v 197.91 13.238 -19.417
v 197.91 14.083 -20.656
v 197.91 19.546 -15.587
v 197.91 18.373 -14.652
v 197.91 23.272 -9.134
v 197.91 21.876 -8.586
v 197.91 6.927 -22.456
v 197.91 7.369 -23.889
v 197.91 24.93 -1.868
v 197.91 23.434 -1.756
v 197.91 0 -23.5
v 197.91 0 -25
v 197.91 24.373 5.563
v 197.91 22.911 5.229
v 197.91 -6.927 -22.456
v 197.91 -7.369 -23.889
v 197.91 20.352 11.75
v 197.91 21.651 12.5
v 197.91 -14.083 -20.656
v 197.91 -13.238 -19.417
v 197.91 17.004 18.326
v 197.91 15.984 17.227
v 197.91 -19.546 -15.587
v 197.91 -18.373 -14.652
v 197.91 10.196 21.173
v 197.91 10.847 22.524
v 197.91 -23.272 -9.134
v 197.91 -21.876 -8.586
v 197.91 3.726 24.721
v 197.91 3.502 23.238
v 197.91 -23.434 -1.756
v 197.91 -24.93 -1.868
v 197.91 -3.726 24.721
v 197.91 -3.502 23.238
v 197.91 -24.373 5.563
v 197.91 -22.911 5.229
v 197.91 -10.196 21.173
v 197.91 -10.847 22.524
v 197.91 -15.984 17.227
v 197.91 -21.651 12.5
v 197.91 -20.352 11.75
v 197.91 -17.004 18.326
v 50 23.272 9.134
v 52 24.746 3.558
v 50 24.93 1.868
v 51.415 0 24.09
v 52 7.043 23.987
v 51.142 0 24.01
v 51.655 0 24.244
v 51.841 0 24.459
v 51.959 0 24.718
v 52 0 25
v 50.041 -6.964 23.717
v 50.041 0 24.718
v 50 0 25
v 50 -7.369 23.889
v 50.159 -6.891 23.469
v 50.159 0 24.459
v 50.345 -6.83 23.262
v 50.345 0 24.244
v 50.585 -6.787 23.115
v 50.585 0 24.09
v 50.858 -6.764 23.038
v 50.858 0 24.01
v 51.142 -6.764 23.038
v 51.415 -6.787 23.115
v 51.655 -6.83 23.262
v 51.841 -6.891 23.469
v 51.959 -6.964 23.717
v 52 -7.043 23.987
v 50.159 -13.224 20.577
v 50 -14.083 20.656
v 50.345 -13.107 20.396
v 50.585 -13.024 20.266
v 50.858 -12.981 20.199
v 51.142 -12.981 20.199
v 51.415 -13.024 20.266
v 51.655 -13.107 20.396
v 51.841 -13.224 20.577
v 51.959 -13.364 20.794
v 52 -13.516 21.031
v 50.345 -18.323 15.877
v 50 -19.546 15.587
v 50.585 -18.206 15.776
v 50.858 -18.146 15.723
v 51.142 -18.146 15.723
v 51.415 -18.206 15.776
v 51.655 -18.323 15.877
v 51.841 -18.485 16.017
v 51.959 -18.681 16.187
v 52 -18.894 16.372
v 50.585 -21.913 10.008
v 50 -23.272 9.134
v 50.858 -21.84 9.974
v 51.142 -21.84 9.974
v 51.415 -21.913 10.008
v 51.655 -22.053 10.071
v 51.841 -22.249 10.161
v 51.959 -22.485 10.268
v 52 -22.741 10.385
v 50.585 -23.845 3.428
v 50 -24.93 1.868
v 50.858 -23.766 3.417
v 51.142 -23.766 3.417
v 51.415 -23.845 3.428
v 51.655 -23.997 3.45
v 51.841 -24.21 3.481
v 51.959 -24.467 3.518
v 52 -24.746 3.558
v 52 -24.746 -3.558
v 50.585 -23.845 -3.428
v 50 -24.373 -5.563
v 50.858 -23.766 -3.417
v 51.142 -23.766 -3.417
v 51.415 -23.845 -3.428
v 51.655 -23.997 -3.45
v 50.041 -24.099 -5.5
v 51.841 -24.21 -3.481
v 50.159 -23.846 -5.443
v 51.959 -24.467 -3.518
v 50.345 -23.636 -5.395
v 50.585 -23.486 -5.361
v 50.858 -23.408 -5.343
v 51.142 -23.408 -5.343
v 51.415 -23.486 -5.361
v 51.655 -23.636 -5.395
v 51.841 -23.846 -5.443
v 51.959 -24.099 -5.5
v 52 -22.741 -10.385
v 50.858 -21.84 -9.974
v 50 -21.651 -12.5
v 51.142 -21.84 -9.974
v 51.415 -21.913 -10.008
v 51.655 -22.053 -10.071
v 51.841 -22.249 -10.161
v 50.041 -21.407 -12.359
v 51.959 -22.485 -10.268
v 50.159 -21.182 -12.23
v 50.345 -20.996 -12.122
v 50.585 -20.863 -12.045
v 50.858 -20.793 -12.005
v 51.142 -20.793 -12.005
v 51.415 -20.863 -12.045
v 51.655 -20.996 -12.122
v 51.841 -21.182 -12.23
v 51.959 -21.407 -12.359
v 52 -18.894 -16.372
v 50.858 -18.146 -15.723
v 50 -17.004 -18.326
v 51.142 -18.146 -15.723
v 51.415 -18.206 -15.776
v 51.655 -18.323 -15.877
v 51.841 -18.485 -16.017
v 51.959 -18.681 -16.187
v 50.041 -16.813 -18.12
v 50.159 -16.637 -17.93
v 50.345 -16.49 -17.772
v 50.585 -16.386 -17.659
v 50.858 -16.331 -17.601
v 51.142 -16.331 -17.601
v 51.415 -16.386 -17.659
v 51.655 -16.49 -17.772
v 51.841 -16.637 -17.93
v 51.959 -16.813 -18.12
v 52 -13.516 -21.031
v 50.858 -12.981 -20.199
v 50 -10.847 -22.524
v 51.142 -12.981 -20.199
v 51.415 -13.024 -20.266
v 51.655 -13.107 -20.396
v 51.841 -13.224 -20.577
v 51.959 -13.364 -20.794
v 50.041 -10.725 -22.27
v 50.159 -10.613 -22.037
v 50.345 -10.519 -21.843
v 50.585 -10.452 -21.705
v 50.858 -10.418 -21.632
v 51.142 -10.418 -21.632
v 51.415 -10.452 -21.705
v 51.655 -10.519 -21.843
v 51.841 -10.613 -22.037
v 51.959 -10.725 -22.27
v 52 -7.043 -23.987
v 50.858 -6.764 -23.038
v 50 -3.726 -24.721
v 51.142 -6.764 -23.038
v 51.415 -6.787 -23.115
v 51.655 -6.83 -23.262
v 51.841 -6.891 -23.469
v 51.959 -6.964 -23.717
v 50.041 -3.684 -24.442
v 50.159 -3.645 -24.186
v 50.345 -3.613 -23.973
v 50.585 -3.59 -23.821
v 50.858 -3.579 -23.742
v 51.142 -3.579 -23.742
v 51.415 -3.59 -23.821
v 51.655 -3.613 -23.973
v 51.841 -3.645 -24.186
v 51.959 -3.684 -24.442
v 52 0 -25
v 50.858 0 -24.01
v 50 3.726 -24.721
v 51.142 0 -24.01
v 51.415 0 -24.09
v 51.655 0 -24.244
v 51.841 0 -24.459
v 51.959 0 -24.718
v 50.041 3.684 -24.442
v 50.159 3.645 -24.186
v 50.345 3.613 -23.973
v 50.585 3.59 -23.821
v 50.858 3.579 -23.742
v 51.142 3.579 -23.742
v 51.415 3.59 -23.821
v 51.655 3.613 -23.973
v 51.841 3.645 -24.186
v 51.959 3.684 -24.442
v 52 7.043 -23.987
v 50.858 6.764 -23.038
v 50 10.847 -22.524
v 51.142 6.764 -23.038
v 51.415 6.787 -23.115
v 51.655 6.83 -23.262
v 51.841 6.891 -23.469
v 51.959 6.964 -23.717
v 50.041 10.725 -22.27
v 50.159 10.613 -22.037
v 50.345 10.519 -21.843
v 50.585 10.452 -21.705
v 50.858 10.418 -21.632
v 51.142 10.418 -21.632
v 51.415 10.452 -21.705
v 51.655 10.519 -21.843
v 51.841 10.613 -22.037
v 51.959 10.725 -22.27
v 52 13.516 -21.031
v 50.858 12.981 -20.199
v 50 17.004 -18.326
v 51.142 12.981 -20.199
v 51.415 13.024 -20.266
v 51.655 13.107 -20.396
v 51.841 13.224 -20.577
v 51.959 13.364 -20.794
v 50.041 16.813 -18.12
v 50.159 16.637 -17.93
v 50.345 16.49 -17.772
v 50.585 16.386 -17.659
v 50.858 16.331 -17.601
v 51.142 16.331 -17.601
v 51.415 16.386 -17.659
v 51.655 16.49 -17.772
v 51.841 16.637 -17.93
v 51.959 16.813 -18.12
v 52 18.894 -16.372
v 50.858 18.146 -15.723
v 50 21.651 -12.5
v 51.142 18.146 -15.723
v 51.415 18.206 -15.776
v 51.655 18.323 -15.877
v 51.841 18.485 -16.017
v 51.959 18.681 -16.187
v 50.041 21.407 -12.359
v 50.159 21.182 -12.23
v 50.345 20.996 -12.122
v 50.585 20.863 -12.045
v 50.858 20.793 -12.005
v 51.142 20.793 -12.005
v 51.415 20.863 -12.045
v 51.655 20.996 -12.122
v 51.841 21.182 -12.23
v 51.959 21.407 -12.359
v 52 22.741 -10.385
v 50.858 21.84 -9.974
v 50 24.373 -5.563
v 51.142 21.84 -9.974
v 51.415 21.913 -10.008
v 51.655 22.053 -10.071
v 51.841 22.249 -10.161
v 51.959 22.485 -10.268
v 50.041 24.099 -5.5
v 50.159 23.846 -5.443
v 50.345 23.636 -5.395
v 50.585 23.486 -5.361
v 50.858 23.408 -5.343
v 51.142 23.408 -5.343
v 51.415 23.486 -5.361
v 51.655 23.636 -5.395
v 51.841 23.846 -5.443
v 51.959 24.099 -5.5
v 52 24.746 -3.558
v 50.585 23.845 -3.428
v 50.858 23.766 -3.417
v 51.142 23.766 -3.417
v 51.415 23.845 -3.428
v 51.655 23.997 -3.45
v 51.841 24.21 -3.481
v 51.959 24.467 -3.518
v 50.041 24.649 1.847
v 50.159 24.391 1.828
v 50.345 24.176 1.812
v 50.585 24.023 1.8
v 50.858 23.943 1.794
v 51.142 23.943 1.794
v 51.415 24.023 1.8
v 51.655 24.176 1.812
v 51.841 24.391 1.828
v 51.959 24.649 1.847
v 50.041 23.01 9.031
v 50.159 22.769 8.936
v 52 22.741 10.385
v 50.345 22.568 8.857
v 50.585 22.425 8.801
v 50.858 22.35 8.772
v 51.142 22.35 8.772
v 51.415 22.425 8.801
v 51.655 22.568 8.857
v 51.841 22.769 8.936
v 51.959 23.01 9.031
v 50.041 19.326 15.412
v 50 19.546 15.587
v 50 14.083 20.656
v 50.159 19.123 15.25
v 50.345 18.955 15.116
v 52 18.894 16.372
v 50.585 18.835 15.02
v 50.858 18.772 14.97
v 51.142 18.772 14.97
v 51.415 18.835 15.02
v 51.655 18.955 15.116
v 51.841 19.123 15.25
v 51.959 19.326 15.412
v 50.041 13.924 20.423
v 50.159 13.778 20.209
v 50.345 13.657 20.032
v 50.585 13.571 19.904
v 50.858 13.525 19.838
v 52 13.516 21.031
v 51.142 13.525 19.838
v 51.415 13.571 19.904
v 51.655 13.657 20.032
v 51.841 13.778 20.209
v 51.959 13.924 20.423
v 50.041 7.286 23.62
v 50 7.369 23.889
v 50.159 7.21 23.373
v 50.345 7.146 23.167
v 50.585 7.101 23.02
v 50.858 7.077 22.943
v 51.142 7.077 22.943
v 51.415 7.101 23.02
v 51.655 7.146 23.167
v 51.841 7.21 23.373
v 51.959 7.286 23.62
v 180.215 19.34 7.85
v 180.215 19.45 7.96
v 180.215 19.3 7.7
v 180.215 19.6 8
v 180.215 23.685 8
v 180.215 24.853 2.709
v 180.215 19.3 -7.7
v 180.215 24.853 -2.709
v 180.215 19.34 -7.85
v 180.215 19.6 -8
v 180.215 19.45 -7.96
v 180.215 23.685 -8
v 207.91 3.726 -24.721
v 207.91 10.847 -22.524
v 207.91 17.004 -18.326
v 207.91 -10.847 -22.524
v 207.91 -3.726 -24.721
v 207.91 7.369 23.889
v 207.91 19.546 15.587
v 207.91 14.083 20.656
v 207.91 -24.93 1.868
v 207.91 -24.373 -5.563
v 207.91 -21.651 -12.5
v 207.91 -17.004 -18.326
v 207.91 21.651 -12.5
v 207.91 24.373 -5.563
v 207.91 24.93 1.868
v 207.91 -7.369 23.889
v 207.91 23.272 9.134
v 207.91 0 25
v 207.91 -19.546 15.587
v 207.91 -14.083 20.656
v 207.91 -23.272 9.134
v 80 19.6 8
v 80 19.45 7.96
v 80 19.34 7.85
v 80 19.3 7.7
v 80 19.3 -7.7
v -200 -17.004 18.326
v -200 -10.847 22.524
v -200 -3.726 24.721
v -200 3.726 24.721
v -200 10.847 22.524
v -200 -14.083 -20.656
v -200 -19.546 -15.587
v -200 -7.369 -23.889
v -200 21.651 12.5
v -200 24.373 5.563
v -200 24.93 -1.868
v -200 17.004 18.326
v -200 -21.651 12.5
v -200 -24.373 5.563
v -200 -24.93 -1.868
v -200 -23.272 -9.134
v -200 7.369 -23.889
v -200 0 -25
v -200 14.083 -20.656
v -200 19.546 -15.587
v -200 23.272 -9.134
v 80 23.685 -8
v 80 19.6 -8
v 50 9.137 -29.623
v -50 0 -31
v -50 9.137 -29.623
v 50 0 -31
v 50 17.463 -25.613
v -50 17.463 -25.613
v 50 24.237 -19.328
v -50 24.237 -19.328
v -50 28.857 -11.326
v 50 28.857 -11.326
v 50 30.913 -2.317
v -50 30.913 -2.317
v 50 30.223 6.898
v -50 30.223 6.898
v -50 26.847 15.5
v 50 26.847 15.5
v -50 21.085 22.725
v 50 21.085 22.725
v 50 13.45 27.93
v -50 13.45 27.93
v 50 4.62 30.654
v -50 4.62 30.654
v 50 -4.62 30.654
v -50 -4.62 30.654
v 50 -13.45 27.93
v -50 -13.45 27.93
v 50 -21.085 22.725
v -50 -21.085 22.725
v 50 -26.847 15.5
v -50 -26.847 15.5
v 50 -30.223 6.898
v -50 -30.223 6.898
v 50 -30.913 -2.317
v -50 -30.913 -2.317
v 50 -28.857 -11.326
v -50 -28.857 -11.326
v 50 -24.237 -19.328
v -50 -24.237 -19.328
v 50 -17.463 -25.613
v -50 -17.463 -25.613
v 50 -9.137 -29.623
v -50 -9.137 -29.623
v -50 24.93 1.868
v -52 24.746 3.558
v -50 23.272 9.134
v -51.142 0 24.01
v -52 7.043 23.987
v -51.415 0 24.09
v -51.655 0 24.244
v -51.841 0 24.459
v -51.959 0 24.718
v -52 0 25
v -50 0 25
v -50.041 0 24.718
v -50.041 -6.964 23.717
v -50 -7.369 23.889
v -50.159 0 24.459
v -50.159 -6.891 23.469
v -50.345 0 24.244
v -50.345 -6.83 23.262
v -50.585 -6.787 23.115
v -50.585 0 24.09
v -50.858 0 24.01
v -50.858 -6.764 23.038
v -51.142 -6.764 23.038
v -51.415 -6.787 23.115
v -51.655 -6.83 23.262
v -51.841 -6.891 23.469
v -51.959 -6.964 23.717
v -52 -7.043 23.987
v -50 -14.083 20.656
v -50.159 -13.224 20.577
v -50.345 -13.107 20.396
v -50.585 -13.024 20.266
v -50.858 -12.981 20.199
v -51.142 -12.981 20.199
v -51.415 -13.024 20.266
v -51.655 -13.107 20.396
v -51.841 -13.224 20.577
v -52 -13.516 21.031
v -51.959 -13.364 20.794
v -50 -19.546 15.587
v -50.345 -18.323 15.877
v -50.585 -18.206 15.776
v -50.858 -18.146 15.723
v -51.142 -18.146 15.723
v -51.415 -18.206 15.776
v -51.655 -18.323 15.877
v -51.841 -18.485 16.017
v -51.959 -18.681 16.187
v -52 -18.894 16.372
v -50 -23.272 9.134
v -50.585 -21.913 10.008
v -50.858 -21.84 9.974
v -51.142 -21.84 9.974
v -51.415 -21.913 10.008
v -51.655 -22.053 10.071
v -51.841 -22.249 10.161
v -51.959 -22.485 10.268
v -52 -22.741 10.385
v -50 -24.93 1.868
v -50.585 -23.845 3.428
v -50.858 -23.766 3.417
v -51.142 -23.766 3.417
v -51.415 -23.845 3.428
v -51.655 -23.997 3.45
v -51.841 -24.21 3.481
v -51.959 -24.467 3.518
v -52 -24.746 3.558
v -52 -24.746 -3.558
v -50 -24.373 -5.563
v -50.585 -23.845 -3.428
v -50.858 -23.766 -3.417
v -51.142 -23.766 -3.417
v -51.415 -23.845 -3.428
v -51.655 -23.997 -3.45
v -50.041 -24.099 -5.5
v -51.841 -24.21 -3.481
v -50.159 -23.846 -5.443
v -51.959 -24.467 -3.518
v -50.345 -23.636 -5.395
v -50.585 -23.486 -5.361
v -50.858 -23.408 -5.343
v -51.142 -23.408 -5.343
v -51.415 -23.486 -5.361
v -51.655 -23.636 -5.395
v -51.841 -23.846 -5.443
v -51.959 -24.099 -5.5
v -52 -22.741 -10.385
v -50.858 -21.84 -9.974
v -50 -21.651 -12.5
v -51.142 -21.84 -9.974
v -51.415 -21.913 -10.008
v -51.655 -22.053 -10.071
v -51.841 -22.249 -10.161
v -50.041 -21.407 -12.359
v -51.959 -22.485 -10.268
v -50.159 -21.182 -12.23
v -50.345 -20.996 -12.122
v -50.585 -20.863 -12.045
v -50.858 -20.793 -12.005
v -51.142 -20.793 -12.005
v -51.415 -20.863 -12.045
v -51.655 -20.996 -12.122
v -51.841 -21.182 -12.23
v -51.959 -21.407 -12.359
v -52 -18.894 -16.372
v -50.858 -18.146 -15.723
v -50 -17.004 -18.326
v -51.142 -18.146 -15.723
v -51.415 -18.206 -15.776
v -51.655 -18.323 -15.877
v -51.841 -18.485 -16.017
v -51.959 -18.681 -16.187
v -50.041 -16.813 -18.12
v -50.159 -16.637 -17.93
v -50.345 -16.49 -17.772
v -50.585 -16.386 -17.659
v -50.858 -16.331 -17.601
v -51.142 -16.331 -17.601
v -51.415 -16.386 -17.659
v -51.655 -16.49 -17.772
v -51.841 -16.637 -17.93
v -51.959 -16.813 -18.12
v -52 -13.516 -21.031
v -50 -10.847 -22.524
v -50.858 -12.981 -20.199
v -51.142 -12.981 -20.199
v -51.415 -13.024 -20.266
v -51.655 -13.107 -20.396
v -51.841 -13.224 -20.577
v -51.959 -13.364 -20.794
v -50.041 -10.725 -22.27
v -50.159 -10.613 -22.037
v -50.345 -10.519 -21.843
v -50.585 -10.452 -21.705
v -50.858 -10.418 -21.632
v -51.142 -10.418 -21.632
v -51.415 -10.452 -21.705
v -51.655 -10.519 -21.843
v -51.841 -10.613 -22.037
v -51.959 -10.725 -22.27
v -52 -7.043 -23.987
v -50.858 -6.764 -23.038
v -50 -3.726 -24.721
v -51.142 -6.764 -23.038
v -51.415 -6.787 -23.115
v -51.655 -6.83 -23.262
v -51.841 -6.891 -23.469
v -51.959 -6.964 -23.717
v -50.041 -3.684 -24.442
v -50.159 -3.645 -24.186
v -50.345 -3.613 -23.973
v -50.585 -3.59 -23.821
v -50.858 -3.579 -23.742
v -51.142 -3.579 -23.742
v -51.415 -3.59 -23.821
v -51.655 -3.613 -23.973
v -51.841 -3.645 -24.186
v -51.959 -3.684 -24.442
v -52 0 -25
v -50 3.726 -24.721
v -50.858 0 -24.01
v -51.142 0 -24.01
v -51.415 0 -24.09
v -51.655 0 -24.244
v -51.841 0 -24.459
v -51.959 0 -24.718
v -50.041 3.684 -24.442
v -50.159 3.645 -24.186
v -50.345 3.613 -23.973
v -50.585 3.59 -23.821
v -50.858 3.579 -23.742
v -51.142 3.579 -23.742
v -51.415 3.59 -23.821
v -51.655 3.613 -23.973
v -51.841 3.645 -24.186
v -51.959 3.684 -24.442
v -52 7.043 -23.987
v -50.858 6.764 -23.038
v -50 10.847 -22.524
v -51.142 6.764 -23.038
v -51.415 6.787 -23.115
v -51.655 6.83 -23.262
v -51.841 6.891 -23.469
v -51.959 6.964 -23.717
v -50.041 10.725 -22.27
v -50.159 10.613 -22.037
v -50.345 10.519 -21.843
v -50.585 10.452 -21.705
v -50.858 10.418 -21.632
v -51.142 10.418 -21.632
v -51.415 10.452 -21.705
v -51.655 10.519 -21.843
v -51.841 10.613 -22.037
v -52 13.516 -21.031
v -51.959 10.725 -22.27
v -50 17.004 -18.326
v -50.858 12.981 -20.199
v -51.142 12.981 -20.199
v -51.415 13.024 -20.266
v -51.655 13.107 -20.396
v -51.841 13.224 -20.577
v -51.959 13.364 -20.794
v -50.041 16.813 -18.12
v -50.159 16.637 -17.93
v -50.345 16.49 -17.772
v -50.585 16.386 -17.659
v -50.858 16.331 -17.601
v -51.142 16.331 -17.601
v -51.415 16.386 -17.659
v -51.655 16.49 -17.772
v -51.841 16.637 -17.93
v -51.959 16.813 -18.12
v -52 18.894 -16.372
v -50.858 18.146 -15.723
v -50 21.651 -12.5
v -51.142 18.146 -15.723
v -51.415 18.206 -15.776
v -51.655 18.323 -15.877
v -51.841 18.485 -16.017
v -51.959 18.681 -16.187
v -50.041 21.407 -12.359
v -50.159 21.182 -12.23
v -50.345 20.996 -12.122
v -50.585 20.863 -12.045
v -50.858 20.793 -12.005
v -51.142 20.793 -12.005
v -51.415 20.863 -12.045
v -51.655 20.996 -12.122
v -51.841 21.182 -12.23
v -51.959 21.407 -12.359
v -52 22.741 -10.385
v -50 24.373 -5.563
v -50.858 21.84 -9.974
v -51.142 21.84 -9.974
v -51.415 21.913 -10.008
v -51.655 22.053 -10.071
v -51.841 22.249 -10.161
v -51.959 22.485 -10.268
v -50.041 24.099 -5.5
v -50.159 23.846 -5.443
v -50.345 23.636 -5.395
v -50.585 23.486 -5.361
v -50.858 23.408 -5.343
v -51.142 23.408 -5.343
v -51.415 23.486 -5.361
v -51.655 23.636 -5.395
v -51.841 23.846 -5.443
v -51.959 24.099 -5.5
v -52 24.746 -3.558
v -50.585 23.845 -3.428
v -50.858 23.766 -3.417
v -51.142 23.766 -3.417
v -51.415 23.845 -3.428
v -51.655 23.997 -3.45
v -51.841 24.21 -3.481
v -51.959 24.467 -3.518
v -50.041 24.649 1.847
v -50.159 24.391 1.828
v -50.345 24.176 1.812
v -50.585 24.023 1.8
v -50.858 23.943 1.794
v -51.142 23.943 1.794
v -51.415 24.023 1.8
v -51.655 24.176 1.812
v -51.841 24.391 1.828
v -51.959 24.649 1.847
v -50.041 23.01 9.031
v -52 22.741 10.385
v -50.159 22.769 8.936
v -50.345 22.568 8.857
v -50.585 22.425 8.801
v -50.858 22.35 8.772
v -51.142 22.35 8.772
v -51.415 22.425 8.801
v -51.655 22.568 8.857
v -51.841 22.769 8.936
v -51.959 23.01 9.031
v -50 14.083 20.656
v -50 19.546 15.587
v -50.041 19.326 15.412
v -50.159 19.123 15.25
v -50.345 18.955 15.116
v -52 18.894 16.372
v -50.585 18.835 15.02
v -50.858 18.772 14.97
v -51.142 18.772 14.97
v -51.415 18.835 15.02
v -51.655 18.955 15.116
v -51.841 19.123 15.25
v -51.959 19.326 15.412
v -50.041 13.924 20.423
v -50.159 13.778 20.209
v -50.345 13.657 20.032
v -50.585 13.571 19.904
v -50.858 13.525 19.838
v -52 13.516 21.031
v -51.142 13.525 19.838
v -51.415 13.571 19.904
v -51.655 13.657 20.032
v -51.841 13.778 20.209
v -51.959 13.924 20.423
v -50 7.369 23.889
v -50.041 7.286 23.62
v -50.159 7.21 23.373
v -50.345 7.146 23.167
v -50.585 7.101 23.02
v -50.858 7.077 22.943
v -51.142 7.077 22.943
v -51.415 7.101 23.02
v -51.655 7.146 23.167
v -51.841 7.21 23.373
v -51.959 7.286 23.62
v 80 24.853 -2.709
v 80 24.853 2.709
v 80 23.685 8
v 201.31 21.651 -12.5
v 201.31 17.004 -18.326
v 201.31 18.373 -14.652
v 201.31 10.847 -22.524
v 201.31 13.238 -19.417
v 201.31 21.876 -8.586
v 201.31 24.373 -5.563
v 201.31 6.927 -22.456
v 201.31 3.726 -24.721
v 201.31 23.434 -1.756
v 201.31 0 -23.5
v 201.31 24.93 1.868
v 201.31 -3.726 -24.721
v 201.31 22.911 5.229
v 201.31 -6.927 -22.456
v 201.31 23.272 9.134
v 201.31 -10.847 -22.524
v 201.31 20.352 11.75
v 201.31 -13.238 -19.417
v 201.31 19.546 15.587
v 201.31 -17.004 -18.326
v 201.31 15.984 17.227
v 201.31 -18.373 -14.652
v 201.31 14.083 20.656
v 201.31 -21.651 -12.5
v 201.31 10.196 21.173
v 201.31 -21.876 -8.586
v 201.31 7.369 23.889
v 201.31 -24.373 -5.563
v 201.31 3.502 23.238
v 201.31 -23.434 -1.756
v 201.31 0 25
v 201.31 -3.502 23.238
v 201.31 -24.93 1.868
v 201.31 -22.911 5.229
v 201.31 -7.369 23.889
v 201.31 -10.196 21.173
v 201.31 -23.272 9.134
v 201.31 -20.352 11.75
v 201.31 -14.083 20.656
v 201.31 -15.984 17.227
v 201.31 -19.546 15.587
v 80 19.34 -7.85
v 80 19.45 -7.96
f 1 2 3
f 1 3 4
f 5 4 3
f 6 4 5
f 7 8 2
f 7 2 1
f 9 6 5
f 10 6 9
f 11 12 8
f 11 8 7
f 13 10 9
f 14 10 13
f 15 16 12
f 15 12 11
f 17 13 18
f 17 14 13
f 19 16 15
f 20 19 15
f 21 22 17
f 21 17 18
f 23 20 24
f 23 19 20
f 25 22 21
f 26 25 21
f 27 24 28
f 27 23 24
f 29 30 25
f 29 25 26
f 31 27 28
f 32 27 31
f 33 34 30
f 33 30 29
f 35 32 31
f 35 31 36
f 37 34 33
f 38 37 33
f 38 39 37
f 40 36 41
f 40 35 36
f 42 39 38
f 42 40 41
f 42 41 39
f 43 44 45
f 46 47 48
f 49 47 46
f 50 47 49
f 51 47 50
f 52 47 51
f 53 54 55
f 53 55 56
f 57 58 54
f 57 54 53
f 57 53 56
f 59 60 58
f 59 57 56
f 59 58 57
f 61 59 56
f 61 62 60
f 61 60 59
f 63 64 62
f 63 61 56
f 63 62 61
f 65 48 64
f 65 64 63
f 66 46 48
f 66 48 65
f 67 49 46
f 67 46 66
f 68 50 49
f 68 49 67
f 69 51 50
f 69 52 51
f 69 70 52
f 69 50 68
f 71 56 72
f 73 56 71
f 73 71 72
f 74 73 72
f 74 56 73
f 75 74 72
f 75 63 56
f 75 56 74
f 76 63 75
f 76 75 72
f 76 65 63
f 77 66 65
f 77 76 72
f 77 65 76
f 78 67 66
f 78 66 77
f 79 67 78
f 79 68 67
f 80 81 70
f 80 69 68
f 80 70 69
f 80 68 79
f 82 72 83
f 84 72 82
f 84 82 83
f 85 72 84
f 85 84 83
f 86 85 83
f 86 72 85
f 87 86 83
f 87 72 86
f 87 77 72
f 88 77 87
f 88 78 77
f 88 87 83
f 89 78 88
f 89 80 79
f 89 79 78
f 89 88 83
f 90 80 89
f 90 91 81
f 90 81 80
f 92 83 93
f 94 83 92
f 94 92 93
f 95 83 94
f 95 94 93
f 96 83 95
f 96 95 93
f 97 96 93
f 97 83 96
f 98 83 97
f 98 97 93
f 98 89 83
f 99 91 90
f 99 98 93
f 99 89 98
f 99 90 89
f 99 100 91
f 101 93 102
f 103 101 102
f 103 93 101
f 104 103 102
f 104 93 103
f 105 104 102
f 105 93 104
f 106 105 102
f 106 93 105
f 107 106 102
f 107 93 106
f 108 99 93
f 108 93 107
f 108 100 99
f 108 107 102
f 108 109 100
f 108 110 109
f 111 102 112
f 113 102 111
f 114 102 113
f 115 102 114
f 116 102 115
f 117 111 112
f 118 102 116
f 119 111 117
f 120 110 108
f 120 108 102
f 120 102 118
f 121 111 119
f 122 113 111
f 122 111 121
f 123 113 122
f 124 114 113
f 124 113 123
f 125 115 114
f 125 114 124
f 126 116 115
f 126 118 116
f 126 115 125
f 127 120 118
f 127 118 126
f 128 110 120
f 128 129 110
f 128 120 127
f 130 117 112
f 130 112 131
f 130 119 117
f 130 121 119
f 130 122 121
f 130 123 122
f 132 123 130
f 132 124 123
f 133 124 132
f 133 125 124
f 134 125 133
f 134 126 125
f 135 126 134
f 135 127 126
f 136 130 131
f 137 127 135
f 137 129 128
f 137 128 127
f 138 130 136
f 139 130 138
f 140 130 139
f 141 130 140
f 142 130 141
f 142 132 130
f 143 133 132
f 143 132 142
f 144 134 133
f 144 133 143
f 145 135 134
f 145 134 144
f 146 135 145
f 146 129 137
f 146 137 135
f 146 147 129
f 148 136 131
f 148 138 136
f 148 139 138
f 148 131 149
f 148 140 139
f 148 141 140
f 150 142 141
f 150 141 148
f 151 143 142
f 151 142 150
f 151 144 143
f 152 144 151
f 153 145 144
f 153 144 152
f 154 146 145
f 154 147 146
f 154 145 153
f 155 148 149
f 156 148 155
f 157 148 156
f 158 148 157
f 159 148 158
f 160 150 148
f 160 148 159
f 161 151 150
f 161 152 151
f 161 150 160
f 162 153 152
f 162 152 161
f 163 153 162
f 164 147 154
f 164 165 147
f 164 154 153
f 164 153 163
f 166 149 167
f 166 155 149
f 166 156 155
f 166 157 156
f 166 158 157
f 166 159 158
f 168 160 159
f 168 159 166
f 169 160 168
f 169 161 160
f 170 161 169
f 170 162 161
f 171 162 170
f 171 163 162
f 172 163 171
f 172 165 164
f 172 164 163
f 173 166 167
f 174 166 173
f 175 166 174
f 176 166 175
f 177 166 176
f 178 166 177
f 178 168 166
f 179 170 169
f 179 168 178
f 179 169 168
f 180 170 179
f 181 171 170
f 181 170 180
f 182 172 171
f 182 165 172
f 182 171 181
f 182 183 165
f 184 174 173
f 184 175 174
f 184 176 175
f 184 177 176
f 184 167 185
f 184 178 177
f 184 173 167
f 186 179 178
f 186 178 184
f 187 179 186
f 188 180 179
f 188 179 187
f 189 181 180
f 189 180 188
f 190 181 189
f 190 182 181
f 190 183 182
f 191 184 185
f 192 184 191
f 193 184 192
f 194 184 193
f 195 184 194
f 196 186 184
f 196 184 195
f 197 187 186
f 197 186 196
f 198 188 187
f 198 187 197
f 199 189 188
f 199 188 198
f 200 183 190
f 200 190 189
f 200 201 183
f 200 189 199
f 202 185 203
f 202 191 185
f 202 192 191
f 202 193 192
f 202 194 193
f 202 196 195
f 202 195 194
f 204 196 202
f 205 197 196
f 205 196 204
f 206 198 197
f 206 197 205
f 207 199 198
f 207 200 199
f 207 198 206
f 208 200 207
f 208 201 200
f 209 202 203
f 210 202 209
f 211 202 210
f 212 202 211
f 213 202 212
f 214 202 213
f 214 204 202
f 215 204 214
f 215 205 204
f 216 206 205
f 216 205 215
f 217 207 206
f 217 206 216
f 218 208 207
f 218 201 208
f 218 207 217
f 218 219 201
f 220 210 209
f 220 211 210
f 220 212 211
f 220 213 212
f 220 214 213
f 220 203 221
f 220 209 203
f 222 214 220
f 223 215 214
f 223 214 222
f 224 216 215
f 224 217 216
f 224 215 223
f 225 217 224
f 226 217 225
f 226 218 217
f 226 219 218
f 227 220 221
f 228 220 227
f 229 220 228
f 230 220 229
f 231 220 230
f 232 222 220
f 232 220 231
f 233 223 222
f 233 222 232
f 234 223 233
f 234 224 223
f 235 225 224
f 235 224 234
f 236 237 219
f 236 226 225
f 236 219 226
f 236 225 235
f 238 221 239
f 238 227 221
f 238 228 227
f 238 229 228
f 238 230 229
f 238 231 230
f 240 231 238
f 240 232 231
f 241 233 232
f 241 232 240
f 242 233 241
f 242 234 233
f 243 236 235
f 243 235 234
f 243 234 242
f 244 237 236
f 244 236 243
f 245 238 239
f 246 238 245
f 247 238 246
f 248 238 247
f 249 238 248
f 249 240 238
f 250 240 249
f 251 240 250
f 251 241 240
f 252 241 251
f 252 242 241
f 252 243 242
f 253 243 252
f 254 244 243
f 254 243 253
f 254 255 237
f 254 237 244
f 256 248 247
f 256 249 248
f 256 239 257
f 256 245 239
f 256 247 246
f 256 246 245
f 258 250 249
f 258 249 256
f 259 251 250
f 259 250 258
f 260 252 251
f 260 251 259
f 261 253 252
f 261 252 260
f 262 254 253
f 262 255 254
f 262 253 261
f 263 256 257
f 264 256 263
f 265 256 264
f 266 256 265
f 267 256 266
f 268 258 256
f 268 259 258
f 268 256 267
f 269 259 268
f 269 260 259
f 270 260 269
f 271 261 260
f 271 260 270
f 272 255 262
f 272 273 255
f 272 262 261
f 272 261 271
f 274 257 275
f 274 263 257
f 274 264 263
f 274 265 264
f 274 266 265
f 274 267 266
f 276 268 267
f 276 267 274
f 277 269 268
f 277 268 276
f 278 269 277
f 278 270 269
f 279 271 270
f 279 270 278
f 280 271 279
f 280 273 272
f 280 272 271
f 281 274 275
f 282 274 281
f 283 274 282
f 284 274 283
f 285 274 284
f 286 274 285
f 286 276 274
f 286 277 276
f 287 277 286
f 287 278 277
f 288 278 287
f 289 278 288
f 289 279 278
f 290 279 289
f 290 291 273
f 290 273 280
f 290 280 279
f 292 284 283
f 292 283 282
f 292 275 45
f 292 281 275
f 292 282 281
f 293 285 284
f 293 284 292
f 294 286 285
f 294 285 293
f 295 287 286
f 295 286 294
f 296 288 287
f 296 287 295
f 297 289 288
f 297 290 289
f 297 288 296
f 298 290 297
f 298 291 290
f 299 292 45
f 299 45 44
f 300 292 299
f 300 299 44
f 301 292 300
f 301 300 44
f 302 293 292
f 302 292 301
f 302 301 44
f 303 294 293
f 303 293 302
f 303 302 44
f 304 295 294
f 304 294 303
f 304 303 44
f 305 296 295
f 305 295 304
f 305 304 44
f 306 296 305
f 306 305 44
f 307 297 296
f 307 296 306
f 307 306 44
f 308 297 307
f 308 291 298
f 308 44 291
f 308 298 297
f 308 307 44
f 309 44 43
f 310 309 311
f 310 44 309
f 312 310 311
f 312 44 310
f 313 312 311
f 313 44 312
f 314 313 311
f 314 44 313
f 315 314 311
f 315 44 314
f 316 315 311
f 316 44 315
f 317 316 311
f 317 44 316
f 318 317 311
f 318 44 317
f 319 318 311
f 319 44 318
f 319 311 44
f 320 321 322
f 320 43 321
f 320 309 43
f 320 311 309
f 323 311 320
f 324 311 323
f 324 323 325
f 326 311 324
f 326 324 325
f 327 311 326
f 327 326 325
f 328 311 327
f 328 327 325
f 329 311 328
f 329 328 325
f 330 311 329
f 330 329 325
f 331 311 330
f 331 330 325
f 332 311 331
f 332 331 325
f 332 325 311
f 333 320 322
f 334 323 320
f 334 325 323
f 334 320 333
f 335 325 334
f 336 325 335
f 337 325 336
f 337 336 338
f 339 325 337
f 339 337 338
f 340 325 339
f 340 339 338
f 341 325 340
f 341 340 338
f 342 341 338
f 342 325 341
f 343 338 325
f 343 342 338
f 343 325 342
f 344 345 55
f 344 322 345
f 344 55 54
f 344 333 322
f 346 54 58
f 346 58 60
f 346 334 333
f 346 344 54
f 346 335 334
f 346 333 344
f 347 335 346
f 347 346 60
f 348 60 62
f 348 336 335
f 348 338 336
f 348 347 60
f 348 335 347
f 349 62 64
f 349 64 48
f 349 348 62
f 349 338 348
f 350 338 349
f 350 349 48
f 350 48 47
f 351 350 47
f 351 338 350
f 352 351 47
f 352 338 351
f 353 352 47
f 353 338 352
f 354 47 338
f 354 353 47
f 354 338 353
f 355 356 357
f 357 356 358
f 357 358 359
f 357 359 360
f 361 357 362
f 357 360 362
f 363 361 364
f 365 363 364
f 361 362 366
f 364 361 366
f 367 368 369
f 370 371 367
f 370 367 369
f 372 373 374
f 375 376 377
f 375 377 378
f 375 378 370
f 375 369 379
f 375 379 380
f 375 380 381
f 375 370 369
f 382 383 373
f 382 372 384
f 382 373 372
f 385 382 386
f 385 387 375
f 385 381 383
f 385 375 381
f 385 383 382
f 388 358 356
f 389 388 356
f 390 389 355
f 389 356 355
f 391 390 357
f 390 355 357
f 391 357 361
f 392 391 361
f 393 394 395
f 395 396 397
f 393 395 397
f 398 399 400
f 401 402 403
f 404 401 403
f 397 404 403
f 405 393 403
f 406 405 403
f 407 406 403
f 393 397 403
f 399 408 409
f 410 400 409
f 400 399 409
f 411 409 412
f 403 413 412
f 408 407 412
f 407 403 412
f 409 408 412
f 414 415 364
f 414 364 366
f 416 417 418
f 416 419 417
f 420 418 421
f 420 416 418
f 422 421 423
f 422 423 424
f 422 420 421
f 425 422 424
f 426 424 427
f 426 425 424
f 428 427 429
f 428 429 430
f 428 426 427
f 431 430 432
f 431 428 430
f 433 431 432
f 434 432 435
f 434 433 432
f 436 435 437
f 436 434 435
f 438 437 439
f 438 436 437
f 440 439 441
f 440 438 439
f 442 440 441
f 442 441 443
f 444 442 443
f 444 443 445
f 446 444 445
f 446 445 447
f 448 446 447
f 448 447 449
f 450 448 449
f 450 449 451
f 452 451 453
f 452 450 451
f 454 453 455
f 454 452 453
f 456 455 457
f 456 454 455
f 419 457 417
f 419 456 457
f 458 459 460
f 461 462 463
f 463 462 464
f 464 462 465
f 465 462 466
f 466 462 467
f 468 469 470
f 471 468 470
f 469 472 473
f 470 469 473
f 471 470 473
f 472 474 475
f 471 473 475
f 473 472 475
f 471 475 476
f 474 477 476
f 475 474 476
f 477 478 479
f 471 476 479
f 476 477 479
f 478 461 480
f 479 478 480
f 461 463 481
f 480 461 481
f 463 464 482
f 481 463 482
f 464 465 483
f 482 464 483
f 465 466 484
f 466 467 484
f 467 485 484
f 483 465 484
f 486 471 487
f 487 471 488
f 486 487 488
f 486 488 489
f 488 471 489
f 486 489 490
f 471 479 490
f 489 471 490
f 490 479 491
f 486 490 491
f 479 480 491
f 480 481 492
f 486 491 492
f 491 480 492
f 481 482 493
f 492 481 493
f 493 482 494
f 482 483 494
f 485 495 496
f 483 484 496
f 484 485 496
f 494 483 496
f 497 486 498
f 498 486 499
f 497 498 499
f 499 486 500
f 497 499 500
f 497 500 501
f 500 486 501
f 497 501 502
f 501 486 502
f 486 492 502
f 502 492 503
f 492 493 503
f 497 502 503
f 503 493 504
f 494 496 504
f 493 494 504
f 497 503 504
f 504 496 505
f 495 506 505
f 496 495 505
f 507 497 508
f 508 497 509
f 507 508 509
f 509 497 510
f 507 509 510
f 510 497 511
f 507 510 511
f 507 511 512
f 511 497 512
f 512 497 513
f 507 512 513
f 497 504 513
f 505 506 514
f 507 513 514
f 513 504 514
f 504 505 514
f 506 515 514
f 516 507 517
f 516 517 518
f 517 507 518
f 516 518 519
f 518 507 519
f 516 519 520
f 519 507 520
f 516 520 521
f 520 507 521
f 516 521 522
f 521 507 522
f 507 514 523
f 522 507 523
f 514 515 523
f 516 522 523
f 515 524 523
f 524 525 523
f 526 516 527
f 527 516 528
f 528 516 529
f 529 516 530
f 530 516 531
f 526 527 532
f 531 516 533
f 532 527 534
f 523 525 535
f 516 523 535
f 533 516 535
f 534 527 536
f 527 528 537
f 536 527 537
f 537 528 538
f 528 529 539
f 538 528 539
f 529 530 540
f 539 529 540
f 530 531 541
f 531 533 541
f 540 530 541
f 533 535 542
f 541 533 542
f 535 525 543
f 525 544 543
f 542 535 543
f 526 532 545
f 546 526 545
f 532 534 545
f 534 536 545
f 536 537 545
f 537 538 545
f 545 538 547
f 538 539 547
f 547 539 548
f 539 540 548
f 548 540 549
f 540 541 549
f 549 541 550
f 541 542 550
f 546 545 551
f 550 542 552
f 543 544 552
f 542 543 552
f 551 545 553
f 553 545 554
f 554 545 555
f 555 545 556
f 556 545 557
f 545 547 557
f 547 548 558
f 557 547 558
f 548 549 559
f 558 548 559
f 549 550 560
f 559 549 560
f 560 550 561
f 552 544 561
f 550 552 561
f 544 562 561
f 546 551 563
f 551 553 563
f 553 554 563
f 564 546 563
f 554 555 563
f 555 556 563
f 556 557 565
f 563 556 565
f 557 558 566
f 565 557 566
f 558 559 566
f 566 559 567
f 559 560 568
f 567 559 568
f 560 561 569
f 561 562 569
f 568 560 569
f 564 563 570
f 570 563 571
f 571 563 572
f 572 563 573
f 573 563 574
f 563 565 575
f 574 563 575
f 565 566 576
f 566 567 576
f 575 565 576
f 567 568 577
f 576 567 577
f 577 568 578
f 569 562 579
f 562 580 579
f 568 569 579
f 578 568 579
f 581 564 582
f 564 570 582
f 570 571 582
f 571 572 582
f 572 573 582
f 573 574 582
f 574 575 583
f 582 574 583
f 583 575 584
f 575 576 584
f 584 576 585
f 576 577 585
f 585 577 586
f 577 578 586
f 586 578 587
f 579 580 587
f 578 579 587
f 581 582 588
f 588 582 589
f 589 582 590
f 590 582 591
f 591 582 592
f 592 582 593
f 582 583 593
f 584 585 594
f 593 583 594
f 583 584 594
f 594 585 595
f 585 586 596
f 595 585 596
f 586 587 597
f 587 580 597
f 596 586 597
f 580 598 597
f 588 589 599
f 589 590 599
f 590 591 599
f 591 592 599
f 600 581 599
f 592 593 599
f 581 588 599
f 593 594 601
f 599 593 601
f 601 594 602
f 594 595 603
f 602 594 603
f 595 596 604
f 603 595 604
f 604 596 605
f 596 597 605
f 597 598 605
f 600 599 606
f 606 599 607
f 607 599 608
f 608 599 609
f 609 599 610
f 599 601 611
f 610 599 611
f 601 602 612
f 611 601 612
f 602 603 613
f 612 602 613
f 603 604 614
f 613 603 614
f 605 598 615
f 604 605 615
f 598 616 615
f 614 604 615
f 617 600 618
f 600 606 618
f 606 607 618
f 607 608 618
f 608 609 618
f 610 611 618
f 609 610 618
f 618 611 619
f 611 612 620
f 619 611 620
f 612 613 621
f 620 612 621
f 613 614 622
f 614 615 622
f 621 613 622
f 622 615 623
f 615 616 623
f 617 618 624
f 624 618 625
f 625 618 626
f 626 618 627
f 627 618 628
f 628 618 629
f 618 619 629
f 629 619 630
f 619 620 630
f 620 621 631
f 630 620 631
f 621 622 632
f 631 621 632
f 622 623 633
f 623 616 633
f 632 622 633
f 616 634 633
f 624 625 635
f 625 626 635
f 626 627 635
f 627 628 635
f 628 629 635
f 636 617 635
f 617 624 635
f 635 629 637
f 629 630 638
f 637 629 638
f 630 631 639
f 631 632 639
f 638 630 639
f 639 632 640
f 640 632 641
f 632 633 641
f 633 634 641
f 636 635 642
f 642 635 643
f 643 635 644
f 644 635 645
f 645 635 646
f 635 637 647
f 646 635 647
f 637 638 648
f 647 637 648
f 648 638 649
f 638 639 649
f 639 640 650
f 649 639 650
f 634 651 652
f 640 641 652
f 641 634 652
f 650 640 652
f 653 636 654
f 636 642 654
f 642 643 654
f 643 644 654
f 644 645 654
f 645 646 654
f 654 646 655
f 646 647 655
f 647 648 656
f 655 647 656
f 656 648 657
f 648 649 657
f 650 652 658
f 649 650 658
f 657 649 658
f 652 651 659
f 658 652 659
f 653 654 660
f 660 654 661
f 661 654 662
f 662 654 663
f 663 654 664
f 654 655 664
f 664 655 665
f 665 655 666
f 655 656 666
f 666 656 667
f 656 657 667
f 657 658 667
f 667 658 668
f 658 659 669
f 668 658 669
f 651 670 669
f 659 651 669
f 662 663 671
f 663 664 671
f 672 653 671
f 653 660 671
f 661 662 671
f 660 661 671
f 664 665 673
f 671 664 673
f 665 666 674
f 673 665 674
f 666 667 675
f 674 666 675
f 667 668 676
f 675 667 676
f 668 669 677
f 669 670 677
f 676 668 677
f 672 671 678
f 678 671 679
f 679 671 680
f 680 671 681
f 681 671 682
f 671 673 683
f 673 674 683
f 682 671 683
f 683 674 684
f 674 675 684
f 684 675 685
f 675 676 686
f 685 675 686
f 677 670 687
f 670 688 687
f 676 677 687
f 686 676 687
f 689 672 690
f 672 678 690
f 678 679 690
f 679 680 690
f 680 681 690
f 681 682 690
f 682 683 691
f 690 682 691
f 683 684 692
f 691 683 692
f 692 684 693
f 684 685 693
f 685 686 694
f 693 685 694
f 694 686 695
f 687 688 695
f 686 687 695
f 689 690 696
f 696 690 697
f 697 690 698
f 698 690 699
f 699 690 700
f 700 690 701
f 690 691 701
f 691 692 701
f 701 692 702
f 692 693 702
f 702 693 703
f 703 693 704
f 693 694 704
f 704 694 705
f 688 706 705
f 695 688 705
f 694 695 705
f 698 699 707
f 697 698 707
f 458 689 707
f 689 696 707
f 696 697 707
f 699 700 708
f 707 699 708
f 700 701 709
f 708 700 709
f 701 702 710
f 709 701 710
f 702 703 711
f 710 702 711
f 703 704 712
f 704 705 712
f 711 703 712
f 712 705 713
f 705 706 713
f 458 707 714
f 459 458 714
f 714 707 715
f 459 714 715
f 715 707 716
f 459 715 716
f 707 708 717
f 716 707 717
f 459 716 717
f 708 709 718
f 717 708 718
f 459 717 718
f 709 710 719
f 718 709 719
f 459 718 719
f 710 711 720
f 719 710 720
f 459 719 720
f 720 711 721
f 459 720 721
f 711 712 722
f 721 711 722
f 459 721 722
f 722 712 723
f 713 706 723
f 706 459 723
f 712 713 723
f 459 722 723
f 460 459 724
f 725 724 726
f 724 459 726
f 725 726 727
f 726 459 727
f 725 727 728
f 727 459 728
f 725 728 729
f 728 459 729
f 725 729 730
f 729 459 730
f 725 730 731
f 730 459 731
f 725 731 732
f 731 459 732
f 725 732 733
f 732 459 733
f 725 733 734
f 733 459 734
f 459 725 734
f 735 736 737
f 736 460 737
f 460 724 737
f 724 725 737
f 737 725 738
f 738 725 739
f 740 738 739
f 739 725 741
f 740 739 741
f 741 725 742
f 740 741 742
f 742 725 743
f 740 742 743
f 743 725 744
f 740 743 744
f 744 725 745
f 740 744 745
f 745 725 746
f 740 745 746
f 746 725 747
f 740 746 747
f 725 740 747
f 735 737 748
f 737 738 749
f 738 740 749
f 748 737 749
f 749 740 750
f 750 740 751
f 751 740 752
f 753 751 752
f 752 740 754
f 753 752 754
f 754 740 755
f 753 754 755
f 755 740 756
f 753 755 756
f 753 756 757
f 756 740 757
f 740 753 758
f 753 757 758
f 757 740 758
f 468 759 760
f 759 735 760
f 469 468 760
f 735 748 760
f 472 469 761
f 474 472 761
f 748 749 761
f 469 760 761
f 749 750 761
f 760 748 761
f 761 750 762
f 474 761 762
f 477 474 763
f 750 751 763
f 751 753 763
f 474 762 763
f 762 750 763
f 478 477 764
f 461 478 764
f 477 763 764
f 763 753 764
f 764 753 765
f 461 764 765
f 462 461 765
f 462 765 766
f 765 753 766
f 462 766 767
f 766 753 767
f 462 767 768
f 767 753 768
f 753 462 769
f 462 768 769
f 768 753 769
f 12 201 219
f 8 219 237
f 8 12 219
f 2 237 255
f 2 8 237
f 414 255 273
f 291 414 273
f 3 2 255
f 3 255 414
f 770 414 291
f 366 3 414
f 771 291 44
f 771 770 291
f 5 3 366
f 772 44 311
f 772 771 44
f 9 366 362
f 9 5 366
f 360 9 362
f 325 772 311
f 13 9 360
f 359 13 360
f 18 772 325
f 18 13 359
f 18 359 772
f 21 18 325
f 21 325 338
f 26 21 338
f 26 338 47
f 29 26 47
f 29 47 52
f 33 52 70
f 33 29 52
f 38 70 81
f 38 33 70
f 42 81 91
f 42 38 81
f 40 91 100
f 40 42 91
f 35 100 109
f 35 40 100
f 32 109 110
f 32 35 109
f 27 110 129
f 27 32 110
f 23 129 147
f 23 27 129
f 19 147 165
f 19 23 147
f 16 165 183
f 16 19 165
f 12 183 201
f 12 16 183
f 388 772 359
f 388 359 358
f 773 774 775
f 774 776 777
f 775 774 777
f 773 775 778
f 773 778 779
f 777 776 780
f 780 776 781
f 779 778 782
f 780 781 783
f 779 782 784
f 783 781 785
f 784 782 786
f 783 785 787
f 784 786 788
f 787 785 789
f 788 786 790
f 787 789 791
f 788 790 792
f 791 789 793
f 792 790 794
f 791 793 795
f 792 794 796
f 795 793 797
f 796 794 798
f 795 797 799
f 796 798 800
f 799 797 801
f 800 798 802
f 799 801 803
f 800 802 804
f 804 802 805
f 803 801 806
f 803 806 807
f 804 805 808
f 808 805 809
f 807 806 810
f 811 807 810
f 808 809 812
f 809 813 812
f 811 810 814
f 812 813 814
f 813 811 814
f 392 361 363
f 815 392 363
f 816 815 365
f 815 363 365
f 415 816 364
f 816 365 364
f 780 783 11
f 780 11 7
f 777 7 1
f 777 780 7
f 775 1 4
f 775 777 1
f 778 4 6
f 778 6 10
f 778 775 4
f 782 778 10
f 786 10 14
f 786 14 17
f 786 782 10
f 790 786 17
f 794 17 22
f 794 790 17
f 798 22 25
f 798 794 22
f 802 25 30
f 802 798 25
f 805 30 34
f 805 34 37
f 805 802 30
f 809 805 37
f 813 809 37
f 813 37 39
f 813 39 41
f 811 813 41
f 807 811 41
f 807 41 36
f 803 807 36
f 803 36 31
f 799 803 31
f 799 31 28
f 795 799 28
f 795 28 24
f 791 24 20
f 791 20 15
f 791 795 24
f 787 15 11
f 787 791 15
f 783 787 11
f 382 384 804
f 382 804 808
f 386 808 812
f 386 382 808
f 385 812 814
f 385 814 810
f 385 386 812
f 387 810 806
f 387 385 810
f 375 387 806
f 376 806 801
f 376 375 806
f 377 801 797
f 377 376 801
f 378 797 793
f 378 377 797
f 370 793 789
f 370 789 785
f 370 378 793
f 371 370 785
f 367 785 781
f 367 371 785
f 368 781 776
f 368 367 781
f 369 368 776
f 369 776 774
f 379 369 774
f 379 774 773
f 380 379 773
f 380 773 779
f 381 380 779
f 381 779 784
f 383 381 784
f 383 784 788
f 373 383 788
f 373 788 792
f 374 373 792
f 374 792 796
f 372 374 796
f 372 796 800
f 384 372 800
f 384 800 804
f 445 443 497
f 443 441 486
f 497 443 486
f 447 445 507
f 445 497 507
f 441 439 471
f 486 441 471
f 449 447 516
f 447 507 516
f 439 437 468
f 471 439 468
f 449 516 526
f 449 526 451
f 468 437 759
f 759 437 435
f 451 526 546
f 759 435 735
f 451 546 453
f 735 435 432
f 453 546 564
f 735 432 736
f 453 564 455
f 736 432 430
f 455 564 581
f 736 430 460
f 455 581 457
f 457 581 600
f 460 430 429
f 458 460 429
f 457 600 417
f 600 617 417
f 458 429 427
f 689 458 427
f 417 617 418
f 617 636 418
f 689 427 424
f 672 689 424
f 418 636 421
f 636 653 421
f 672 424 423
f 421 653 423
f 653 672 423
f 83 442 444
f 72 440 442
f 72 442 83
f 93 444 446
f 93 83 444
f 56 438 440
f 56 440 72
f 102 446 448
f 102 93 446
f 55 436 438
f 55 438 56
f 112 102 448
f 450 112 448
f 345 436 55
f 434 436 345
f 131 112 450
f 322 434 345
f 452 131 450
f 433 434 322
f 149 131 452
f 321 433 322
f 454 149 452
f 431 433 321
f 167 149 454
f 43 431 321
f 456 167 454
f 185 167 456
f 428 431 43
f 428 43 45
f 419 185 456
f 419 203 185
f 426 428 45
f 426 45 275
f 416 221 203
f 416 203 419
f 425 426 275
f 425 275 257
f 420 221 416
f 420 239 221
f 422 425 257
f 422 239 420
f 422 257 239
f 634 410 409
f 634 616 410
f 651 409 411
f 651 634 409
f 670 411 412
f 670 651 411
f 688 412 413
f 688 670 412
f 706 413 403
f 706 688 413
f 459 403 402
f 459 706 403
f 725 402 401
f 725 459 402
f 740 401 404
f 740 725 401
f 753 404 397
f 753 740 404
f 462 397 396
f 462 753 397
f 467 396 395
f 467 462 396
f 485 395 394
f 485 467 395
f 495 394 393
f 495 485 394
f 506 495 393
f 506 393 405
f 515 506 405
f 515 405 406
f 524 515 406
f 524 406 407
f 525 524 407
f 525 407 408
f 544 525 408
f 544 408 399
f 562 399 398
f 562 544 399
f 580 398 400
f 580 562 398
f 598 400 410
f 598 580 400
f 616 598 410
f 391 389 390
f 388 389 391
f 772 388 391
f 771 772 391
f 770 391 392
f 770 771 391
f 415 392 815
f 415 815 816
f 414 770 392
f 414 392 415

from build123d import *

# Parameters (mm, degrees)
SKETCH1_R           = 31
BOSS_EXTRUDE1_DEPTH = 50
SKETCH1_4_R         = 25
BOSS_EXTRUDE2_DEPTH = 200
CUT_EXTRUDE1_START  = 130.215
CUT_EXTRUDE1_DEPTH  = 100.215
BOSS_EXTRUDE3_START = 7.91
SKETCH5_R           = 25
BOSS_EXTRUDE3_DEPTH = 7.91
CUT_EXTRUDE2_START  = -6.6
SKETCH6_R           = 25
SKETCH6_R_2         = 23.5
CUT_EXTRUDE2_DEPTH  = 3.4


with BuildPart() as part:
    # Sketch1 → Boss-Extrude1 (new, symmetric)
    with BuildSketch(Plane(origin=(0, 0, 0), x_dir=(0, 0, -1), z_dir=(1, 0, 0))):
        Circle(SKETCH1_R)
    extrude(amount=BOSS_EXTRUDE1_DEPTH, both=True)

    # Sketch1<4> → Boss-Extrude2 (add, symmetric)
    with BuildSketch(Plane(origin=(0, 0, 0), x_dir=(0, 0, -1), z_dir=(1, 0, 0))):
        Circle(SKETCH1_4_R)
    extrude(amount=BOSS_EXTRUDE2_DEPTH, both=True)

    # Sketch3 → Cut-Revolve1 (revolve, cut)
    with BuildSketch(Plane.XY):
        with BuildLine():
            Line((52, 25), (50, 25))
            ThreePointArc((50, 25), (51, 24), (52, 25))
        make_face()
        with BuildLine():
            Line((-52, 25), (-50, 25))
            ThreePointArc((-50, 25), (-51, 24), (-52, 25))
        make_face()
    revolve(axis=Axis((0, 0, 0), (1, 0, 0)), mode=Mode.SUBTRACT)

    # Sketch4 → Cut-Extrude1 (cut)
    with BuildSketch(Plane(origin=(50, 0, 0), x_dir=(0, 0, -1), z_dir=(1, 0, 0)).offset(CUT_EXTRUDE1_START)):
        with BuildLine():
            Line((-8, 23.685438565), (-8, 19.6))
            ThreePointArc((-8, 19.6), (-7.912132034, 19.387867966), (-7.7, 19.3))
            Line((-7.7, 19.3), (7.7, 19.3))
            ThreePointArc((7.7, 19.3), (7.912132034, 19.387867966), (8, 19.6))
            Line((8, 19.6), (8, 23.685438565))
            ThreePointArc((8, 23.685438565), (0, 25), (-8, 23.685438565))
        make_face()
    extrude(amount=-CUT_EXTRUDE1_DEPTH, mode=Mode.SUBTRACT)

    # Sketch5 → Boss-Extrude3 (add)
    with BuildSketch(Plane(origin=(200, 0, 0), x_dir=(0, 0, -1), z_dir=(1, 0, 0)).offset(BOSS_EXTRUDE3_START)):
        Circle(SKETCH5_R)
    extrude(amount=-BOSS_EXTRUDE3_DEPTH)

    # Sketch6 → Cut-Extrude2 (cut)
    with BuildSketch(Plane(origin=(207.91, 0, 0), x_dir=(0, 0, -1), z_dir=(1, 0, 0)).offset(CUT_EXTRUDE2_START)):
        Circle(SKETCH6_R)
        Circle(SKETCH6_R_2, mode=Mode.SUBTRACT)
    extrude(amount=-CUT_EXTRUDE2_DEPTH, mode=Mode.SUBTRACT)


solid = part.part
